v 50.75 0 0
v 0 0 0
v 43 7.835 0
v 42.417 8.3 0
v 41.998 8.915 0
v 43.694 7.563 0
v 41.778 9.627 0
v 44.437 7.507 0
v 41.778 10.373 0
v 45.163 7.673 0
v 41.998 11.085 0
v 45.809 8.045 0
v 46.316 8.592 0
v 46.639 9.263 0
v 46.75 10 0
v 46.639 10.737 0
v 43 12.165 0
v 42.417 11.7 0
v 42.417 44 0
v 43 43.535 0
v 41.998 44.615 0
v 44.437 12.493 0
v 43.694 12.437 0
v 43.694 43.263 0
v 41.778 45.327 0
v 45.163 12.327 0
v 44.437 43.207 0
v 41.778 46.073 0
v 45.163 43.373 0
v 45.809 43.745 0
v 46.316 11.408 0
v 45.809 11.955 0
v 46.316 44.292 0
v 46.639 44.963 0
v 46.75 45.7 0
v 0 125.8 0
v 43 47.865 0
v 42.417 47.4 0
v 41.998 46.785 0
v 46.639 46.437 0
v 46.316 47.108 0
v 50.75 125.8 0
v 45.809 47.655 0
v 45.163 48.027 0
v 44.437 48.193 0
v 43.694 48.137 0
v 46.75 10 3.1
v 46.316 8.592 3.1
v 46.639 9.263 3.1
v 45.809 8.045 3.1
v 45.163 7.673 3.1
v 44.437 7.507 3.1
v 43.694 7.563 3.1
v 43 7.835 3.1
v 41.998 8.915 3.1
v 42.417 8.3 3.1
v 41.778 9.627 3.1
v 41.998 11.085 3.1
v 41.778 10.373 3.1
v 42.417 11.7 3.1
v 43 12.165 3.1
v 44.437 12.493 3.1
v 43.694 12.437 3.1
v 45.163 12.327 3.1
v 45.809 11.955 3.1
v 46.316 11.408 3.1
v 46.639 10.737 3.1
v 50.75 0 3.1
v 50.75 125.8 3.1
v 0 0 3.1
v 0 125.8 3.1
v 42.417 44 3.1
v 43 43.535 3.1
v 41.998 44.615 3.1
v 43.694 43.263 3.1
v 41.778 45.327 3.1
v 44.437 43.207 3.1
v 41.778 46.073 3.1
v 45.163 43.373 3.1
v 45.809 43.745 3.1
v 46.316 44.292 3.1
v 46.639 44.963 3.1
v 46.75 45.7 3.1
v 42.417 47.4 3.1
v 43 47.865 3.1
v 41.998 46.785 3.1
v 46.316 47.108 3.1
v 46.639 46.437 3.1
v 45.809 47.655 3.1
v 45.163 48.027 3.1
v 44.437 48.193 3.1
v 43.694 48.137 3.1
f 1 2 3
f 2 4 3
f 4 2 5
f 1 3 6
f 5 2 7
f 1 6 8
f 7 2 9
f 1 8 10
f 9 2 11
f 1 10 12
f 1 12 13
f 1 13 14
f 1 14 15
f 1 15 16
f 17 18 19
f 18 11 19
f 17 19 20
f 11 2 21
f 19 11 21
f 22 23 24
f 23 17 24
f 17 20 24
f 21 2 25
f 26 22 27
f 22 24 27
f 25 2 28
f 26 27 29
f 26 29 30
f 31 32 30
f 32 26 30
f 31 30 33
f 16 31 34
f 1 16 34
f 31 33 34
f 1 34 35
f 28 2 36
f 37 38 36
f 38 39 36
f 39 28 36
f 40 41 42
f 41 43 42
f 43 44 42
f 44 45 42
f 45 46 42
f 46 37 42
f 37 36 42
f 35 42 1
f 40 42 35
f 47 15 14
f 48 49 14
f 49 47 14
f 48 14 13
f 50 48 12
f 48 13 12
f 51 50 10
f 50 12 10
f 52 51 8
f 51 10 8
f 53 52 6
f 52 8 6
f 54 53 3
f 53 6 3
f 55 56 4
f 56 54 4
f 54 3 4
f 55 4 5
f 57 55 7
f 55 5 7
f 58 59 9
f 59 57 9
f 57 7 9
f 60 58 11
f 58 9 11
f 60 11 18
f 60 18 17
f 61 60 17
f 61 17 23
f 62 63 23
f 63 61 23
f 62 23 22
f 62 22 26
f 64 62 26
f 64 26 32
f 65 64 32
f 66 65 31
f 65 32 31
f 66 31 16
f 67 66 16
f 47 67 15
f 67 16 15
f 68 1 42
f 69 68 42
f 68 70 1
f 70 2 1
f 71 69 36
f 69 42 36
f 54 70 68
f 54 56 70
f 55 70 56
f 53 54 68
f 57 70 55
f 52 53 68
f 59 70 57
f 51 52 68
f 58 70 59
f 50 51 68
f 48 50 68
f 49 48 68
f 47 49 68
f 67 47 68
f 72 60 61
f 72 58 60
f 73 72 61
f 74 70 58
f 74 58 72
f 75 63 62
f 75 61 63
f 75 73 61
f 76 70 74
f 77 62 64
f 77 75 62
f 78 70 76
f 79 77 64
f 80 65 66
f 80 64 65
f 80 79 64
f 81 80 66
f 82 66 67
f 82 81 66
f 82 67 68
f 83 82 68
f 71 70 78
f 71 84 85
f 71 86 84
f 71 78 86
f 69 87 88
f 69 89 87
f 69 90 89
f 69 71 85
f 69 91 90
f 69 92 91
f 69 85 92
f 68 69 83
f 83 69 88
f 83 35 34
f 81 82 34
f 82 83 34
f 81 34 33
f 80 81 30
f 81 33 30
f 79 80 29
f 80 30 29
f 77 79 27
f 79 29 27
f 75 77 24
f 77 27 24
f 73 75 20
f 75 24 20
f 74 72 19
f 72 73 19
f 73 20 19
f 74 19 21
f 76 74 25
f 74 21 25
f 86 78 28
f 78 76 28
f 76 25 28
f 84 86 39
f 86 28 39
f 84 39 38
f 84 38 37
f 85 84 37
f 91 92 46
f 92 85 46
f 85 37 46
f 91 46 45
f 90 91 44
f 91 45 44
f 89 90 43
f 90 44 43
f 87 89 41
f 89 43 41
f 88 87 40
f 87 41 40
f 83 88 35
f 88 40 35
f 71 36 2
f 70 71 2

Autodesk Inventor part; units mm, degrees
ref_plane "YZ Plane" through (0, 0, 0) normal (1, 0, 0) x (0, 1, 0)
ref_plane "XZ Plane" through (0, 0, 0) normal (0, 1, 0) x (-1, 0, 0)
ref_plane "XY Plane" through (0, 0, 0) normal (0, 0, 1) x (1, 0, 0)
sketch "Sketch1" plane through (0, 0, 0) normal (0, 0, 1) x (1, 0, 0)
  line L0 (50.75, 0) -> (50.75, 125.8)
  line L1 (50.75, 125.8) -> (0, 125.8)
  line L2 (0, 125.8) -> (0, 0)
  circle A0 centre (44.25, 10) radius 2.5
  circle A1 centre (44.25, 45.7) radius 2.5
  line L3 (0, 0) -> (50.75, 0)
  dimension "d0" = 50.75
  dimension "d1" = 125.8
  dimension "d2" = 5
  dimension "d3" = 5
  dimension "d14" = 10
  dimension "d15" = 35.7
  dimension "d16" = 6.5
  dimension "d17" = 6.5
extrude "Extrusion1" add sketch "Sketch1" along normal blind 3.1
properties part number "BatteryBracket"
